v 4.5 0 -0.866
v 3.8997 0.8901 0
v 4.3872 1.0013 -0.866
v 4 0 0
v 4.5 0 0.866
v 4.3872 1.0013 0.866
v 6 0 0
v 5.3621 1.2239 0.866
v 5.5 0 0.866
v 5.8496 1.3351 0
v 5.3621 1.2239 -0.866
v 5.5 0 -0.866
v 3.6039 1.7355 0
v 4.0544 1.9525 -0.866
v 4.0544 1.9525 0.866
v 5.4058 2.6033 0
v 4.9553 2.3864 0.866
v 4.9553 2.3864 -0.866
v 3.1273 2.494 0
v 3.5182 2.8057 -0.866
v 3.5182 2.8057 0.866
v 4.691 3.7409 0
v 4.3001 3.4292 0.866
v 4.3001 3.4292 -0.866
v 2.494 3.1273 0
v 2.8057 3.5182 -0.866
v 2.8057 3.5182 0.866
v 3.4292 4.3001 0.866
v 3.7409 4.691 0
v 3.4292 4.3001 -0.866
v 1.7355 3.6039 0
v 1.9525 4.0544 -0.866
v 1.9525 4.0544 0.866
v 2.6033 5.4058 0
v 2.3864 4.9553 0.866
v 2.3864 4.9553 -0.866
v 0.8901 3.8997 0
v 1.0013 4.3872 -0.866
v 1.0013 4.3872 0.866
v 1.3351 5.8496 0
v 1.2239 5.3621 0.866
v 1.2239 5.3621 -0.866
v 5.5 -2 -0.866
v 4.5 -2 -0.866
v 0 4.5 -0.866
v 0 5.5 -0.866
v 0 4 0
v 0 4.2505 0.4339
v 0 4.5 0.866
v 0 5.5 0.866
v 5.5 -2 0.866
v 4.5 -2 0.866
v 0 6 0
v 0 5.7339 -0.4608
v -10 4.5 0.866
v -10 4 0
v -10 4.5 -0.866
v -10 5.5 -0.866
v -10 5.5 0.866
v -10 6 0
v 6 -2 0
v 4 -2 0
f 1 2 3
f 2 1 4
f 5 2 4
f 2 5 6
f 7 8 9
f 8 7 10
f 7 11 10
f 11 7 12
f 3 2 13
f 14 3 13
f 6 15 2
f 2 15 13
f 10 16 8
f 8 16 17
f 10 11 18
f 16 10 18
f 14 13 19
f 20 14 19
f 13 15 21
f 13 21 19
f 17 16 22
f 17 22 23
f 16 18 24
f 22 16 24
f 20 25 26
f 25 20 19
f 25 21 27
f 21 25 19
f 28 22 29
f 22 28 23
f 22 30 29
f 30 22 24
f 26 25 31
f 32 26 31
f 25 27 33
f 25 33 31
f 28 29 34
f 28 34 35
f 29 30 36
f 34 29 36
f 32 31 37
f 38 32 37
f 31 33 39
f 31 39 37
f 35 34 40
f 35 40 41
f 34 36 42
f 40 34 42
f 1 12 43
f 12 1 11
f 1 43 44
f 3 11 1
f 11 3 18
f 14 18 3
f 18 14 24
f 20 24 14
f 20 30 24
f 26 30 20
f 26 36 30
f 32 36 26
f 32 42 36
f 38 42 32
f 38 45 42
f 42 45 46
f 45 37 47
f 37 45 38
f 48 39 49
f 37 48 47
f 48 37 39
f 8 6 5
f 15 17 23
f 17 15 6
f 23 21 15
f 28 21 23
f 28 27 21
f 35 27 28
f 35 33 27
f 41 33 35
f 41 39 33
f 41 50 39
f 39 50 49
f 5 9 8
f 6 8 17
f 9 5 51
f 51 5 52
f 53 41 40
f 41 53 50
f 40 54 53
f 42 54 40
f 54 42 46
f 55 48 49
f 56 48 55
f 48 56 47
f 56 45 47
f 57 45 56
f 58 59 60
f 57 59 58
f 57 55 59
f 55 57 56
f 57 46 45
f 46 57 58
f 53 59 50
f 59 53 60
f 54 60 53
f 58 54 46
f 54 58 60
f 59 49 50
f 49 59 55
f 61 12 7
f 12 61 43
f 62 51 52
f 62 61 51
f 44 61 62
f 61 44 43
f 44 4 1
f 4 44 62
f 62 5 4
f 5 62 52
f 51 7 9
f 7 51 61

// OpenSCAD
module Hexagon_socket_screw_keys(){

    module regular_polygon(order = 6, r=1){
         angles=[ for (i = [0:order-1]) i*(360/order) ];
         coords=[ for (th=angles) [r*cos(th), r*sin(th)] ];
         polygon(coords);
     }
     
    color("#a8b0b2")
    rotate_extrude(angle = 90, $fn = 30)
    translate([5,0,0])
    regular_polygon(); 
     
    translate([0,5,0])

    color("#a8b0b2")
    rotate([30,0,0])
    rotate([00,-90,00])
    linear_extrude(height = 10) 

    //translate([5,0,0])
    regular_polygon(); 
     
    color("#a8b0b2")
    translate([5,0,0])
    rotate([90,-0,00])
    linear_extrude(height = 2) 

    //translate([5,0,0])
    regular_polygon(); 
      
  
}

Hexagon_socket_screw_keys();


// Written by Nicolì Angelo (Gengio) 2024: 
// MIT License

//Permission is hereby granted, free of charge, to any person obtaining a copy of this software and associated documentation files (the "Software"), to deal in the Software without restriction, including without limitation the rights to use, copy, modify, merge, publish, distribute, sublicense, and/or sell copies of the Software, and to permit persons to whom the Software is furnished to do so, subject to the following conditions:

//The above copyright notice and this permission notice shall be included in all copies or substantial portions of the Software.

//THE SOFTWARE IS PROVIDED "AS IS", WITHOUT WARRANTY OF ANY KIND, EXPRESS OR IMPLIED, INCLUDING BUT NOT LIMITED TO THE WARRANTIES OF MERCHANTABILITY, FITNESS FOR A PARTICULAR PURPOSE AND NONINFRINGEMENT. IN NO EVENT SHALL THE AUTHORS OR COPYRIGHT HOLDERS BE LIABLE FOR ANY CLAIM, DAMAGES OR OTHER LIABILITY, WHETHER IN AN ACTION OF CONTRACT, TORT OR OTHERWISE, ARISING FROM, OUT OF OR IN CONNECTION WITH THE SOFTWARE OR THE USE OR OTHER DEALINGS IN THE SOFTWARE.
